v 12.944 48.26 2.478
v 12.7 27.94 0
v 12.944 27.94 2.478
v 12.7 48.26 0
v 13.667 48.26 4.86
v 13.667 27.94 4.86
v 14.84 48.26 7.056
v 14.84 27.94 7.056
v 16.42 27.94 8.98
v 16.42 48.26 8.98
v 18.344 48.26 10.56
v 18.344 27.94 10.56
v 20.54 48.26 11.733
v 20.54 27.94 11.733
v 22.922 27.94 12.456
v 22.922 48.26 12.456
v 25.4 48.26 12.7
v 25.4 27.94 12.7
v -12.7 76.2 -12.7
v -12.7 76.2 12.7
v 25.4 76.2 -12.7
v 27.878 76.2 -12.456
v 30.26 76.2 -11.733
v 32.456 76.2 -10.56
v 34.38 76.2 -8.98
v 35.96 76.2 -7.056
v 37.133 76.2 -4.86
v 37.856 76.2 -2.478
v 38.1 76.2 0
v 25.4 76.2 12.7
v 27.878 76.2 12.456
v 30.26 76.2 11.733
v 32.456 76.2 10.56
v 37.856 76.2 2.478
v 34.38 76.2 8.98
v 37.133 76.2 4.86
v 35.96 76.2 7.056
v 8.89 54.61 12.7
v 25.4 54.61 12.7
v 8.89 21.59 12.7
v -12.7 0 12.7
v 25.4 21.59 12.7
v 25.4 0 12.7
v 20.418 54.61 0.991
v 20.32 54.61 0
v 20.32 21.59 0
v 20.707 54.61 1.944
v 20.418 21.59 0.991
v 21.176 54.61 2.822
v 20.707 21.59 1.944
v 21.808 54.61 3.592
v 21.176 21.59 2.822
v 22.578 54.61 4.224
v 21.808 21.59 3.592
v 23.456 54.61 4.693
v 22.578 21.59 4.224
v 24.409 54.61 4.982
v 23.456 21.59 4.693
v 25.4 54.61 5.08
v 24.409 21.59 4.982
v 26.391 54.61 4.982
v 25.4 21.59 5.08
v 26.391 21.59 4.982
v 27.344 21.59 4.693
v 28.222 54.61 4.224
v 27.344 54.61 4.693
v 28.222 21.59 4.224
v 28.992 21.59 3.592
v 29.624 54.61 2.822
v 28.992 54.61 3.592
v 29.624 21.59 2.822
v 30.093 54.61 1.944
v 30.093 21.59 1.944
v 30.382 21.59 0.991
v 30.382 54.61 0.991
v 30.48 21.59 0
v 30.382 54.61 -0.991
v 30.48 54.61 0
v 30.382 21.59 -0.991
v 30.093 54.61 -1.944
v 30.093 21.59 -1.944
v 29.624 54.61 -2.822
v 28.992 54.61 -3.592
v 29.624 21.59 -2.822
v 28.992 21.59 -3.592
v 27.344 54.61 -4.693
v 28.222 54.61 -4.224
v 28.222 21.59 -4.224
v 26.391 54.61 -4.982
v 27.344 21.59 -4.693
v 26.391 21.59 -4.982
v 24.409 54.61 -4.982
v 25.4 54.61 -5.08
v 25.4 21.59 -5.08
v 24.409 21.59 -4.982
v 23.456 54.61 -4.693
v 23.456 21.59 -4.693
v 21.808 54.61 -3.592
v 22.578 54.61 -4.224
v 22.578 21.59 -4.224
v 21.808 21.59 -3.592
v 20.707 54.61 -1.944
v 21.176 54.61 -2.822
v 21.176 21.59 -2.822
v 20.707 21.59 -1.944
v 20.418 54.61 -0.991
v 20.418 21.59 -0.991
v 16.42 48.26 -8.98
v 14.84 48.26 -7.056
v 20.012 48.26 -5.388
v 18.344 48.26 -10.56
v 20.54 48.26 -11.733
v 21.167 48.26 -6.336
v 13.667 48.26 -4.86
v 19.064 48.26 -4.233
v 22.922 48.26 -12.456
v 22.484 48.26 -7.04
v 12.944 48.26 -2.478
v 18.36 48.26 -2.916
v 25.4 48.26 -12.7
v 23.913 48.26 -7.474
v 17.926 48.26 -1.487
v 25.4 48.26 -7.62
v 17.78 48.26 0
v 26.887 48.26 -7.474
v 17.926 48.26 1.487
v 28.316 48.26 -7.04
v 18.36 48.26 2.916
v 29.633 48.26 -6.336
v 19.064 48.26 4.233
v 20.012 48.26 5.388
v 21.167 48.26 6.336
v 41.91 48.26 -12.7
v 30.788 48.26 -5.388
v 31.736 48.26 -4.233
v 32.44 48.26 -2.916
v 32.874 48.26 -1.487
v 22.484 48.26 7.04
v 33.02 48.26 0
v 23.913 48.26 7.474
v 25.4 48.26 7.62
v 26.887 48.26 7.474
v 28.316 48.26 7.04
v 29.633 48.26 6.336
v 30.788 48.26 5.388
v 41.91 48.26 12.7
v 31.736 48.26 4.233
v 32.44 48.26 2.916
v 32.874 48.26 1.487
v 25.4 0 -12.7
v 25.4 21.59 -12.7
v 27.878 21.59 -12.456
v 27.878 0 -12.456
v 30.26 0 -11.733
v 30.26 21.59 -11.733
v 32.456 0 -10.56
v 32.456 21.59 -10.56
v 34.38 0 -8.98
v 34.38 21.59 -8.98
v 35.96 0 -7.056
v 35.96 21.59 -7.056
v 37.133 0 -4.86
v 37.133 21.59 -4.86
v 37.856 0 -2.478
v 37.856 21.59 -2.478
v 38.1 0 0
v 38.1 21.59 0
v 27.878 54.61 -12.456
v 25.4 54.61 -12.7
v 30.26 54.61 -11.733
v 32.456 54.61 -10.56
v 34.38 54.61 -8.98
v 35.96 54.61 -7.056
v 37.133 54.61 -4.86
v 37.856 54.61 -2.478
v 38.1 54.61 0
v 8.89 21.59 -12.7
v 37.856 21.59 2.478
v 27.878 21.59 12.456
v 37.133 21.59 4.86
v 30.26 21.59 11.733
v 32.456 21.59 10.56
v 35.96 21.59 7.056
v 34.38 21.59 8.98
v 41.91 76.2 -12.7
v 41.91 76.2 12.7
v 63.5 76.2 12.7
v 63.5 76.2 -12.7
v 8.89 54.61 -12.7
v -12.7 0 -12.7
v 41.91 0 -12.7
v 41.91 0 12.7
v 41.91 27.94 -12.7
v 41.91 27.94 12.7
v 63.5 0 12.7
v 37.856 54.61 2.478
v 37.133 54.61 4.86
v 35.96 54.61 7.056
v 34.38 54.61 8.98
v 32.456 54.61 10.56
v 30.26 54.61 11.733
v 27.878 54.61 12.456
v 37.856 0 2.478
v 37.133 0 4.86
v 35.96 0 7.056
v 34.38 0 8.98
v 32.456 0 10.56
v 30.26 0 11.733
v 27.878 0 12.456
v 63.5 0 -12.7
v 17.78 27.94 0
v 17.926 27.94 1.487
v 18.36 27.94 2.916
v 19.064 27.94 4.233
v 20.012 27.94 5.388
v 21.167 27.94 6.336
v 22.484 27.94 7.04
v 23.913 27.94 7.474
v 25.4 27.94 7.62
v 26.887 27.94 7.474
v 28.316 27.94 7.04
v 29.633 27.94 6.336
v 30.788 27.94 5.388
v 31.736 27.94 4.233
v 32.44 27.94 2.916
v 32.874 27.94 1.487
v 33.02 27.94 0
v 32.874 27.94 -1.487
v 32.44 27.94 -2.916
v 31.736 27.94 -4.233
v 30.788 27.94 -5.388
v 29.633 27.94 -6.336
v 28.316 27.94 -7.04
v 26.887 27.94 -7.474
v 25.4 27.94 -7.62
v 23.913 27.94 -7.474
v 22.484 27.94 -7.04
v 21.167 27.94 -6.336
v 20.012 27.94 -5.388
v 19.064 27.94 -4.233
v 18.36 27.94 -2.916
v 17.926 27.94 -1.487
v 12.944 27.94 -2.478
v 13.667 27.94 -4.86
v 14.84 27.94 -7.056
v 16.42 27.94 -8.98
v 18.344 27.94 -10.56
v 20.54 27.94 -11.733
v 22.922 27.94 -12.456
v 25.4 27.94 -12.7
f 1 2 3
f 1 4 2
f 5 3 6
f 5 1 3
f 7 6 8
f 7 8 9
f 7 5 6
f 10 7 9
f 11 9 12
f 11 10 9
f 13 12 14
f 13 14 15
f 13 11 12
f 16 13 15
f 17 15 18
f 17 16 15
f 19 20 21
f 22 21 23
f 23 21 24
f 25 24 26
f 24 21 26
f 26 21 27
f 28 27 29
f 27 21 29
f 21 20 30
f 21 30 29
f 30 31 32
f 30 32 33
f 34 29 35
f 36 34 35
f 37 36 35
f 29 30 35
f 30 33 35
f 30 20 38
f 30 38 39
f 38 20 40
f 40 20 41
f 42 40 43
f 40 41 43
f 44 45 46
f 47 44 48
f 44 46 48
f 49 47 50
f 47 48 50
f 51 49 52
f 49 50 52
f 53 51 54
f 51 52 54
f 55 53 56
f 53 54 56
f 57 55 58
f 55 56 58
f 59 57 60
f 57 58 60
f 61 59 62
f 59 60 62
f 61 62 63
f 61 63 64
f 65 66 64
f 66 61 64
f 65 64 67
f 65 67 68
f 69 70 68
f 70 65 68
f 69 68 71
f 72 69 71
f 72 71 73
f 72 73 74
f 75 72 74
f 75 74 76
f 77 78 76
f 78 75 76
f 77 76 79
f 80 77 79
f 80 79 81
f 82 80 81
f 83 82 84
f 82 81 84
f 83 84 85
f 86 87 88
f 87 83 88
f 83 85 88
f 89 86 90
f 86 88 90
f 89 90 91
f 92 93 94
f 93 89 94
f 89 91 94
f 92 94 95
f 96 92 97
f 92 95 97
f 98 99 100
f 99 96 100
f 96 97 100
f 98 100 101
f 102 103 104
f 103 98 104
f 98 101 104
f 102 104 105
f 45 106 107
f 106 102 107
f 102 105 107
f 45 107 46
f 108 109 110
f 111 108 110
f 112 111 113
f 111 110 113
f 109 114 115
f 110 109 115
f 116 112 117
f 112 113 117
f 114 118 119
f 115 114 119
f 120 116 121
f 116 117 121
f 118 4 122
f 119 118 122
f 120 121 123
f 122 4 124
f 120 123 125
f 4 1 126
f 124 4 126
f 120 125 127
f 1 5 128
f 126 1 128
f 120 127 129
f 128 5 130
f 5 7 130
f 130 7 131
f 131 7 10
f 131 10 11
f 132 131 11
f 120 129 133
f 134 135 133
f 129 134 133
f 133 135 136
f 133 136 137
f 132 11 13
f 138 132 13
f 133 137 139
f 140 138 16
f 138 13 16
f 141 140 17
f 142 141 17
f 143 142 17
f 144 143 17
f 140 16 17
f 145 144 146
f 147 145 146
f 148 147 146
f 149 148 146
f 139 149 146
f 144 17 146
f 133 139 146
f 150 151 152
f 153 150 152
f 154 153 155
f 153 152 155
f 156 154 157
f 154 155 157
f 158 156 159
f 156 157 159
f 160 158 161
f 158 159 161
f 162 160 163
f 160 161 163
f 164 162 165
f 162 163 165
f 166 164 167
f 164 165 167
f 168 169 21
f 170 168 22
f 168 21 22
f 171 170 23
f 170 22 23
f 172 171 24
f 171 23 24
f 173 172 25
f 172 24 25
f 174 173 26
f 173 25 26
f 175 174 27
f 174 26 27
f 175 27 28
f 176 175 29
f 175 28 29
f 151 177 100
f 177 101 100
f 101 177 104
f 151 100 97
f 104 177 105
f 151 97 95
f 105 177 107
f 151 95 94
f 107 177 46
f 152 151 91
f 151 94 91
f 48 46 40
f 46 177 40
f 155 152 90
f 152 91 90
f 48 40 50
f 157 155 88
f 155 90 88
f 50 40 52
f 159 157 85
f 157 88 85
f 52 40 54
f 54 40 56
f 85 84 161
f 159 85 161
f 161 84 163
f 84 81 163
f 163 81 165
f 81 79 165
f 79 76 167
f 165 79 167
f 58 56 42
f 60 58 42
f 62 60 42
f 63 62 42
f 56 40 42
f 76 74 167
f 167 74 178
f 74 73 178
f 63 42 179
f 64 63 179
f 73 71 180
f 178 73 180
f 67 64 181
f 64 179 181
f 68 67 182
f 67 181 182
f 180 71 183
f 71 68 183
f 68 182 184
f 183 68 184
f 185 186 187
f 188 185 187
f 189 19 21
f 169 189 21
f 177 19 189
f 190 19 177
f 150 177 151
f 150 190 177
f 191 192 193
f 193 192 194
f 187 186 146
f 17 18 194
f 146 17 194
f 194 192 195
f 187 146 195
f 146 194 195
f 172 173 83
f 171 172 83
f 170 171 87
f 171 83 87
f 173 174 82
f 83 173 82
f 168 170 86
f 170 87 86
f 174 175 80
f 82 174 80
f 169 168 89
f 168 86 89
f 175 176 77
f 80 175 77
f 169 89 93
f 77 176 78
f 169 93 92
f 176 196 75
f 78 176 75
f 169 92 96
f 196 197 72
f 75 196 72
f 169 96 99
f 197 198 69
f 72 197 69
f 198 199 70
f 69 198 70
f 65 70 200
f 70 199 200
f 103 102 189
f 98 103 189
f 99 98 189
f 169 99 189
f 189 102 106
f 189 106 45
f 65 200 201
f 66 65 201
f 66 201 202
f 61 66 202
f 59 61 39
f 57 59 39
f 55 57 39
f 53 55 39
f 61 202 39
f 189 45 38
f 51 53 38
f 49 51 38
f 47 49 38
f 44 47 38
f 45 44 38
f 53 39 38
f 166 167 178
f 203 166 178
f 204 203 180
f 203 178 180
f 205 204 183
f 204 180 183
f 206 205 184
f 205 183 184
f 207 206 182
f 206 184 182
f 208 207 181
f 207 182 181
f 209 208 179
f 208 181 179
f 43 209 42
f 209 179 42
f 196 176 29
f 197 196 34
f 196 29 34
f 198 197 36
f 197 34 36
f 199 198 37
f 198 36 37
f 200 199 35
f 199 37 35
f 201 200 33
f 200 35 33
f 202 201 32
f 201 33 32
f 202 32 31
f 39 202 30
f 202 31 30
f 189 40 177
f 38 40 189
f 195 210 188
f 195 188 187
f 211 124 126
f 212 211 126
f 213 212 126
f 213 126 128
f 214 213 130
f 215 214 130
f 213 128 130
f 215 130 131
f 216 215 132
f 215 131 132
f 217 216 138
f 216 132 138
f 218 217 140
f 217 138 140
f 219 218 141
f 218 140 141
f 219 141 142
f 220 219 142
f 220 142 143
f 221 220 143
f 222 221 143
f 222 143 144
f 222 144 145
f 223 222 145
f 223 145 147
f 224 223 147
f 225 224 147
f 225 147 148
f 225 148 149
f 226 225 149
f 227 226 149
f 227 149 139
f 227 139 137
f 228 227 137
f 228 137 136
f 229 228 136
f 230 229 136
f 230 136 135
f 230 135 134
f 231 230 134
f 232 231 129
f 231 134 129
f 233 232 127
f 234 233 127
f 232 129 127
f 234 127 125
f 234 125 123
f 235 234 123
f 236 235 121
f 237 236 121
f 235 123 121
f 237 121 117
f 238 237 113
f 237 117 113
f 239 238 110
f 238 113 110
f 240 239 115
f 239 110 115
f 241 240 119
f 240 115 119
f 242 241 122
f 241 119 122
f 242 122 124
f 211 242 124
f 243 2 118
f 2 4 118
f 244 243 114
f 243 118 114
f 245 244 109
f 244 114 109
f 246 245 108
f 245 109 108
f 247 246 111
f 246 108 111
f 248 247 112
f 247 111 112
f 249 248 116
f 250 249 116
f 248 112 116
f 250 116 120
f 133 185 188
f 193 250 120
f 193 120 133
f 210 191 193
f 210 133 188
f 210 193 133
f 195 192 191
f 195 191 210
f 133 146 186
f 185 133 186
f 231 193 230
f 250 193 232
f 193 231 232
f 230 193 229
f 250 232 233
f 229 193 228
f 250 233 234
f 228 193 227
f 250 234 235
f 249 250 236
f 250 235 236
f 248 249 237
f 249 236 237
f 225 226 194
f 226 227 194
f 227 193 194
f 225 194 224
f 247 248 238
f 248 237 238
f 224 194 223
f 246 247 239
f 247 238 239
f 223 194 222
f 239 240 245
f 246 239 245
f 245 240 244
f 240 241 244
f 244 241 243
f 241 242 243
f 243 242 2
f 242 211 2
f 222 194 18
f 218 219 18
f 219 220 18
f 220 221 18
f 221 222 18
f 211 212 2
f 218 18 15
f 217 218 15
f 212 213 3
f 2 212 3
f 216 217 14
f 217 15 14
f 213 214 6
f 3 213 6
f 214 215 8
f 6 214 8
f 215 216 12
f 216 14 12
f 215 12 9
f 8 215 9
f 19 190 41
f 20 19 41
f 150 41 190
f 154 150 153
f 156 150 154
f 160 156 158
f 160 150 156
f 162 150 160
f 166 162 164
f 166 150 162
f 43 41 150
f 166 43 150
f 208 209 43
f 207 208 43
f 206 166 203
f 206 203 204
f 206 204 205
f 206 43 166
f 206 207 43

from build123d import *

# Parameters (mm, degrees)
F0_W      = 50.8
F0_H      = 25.4
F1_DEPTH  = 76.2
F2_R      = 12.69999
F3_W      = 28.8026324581
F3_H      = 33.02
F3_W_2    = 16.51001
F4_DEPTH  = 25.4
F5_R      = 5.08
F6_DEPTH  = 34.2138
F7_W      = 50.8
F7_H      = 25.4
F8_DEPTH  = 76.2
F9_W      = 29.21
F9_H      = 27.94
F10_DEPTH = 25.4
F11_R     = 12.69999
F12_R     = 7.62
F13_DEPTH = 25.4


# Not quite as in the source:
# - a fillet or chamfer is up to 0.001 mm smaller than in the source, because OpenCascade refuses the exact size


with BuildPart() as f1:
    # F0 (on Front) → F1 (new body)
    with BuildSketch(Plane.XZ):
        with Locations((12.7, 0)):
            Rectangle(F0_W, F0_H)
    extrude(amount=-F1_DEPTH)

    # F2 (radius 12.7 in the source; OpenCascade refuses exactly that, so slightly less here)
    f2_edges = [f1.edges().sort_by_distance(p)[0] for p in [
        (38.1, 38.1, 12.7),
        (38.1, 38.1, -12.7),
    ]]
    fillet(f2_edges, radius=F2_R)

    # F3 (on face) → F4 (cut)
    with BuildSketch(Plane.XY.offset(12.7)):
        with Locations((39.8013262291, 38.1)):
            Rectangle(F3_W, F3_H)
        with Locations((17.145005, 38.1)):
            Rectangle(F3_W_2, F3_H)
    extrude(amount=-F4_DEPTH, mode=Mode.SUBTRACT)

    # F5 (on face) → F6 (join)
    with BuildSketch(Plane(origin=(0, 21.59, 0), x_dir=(-1, 0, 0), z_dir=(0, 1, 0))):
        with Locations((-25.4, 0)):
            Circle(F5_R)
    extrude(amount=F6_DEPTH)


with BuildPart() as f8:
    # F7 (on Front) → F8 (new body)
    with BuildSketch(Plane.XZ):
        with Locations((38.1, 0)):
            Rectangle(F7_W, F7_H)
    extrude(amount=-F8_DEPTH)

    # F9 (on face) → F10 (cut)
    with BuildSketch(Plane.XY.offset(12.7)):
        with Locations((27.305, 62.23)):
            Rectangle(F9_W, F9_H)
        Polygon((41.91, 76.2), (41.91, 78.74), (-8.89, 78.74), (-8.89, -2.54), (41.91, -2.54), (41.91, 0), (12.7, 0), (12.7, 27.94), (3.81, 27.94), (3.81, 48.26), (12.7, 48.26), (12.7, 76.2), align=None)
        with Locations((27.305, 13.97)):
            Rectangle(F9_W, F9_H)
    extrude(amount=-F10_DEPTH, mode=Mode.SUBTRACT)

    # F11 (radius 12.7 in the source; OpenCascade refuses exactly that, so slightly less here)
    f11_edges = [f8.edges().sort_by_distance(p)[0] for p in [
        (12.7, 38.1, 12.7),
        (12.7, 38.1, -12.7),
    ]]
    fillet(f11_edges, radius=F11_R)

    # F12 (on face) → F13 (cut)
    with BuildSketch(Plane(origin=(0, 48.26, 0), x_dir=(-1, 0, 0), z_dir=(0, 1, 0))):
        with Locations((-25.4, 0)):
            Circle(F12_R)
    extrude(amount=-F13_DEPTH, mode=Mode.SUBTRACT)


solid = Compound([f1.part, f8.part])
